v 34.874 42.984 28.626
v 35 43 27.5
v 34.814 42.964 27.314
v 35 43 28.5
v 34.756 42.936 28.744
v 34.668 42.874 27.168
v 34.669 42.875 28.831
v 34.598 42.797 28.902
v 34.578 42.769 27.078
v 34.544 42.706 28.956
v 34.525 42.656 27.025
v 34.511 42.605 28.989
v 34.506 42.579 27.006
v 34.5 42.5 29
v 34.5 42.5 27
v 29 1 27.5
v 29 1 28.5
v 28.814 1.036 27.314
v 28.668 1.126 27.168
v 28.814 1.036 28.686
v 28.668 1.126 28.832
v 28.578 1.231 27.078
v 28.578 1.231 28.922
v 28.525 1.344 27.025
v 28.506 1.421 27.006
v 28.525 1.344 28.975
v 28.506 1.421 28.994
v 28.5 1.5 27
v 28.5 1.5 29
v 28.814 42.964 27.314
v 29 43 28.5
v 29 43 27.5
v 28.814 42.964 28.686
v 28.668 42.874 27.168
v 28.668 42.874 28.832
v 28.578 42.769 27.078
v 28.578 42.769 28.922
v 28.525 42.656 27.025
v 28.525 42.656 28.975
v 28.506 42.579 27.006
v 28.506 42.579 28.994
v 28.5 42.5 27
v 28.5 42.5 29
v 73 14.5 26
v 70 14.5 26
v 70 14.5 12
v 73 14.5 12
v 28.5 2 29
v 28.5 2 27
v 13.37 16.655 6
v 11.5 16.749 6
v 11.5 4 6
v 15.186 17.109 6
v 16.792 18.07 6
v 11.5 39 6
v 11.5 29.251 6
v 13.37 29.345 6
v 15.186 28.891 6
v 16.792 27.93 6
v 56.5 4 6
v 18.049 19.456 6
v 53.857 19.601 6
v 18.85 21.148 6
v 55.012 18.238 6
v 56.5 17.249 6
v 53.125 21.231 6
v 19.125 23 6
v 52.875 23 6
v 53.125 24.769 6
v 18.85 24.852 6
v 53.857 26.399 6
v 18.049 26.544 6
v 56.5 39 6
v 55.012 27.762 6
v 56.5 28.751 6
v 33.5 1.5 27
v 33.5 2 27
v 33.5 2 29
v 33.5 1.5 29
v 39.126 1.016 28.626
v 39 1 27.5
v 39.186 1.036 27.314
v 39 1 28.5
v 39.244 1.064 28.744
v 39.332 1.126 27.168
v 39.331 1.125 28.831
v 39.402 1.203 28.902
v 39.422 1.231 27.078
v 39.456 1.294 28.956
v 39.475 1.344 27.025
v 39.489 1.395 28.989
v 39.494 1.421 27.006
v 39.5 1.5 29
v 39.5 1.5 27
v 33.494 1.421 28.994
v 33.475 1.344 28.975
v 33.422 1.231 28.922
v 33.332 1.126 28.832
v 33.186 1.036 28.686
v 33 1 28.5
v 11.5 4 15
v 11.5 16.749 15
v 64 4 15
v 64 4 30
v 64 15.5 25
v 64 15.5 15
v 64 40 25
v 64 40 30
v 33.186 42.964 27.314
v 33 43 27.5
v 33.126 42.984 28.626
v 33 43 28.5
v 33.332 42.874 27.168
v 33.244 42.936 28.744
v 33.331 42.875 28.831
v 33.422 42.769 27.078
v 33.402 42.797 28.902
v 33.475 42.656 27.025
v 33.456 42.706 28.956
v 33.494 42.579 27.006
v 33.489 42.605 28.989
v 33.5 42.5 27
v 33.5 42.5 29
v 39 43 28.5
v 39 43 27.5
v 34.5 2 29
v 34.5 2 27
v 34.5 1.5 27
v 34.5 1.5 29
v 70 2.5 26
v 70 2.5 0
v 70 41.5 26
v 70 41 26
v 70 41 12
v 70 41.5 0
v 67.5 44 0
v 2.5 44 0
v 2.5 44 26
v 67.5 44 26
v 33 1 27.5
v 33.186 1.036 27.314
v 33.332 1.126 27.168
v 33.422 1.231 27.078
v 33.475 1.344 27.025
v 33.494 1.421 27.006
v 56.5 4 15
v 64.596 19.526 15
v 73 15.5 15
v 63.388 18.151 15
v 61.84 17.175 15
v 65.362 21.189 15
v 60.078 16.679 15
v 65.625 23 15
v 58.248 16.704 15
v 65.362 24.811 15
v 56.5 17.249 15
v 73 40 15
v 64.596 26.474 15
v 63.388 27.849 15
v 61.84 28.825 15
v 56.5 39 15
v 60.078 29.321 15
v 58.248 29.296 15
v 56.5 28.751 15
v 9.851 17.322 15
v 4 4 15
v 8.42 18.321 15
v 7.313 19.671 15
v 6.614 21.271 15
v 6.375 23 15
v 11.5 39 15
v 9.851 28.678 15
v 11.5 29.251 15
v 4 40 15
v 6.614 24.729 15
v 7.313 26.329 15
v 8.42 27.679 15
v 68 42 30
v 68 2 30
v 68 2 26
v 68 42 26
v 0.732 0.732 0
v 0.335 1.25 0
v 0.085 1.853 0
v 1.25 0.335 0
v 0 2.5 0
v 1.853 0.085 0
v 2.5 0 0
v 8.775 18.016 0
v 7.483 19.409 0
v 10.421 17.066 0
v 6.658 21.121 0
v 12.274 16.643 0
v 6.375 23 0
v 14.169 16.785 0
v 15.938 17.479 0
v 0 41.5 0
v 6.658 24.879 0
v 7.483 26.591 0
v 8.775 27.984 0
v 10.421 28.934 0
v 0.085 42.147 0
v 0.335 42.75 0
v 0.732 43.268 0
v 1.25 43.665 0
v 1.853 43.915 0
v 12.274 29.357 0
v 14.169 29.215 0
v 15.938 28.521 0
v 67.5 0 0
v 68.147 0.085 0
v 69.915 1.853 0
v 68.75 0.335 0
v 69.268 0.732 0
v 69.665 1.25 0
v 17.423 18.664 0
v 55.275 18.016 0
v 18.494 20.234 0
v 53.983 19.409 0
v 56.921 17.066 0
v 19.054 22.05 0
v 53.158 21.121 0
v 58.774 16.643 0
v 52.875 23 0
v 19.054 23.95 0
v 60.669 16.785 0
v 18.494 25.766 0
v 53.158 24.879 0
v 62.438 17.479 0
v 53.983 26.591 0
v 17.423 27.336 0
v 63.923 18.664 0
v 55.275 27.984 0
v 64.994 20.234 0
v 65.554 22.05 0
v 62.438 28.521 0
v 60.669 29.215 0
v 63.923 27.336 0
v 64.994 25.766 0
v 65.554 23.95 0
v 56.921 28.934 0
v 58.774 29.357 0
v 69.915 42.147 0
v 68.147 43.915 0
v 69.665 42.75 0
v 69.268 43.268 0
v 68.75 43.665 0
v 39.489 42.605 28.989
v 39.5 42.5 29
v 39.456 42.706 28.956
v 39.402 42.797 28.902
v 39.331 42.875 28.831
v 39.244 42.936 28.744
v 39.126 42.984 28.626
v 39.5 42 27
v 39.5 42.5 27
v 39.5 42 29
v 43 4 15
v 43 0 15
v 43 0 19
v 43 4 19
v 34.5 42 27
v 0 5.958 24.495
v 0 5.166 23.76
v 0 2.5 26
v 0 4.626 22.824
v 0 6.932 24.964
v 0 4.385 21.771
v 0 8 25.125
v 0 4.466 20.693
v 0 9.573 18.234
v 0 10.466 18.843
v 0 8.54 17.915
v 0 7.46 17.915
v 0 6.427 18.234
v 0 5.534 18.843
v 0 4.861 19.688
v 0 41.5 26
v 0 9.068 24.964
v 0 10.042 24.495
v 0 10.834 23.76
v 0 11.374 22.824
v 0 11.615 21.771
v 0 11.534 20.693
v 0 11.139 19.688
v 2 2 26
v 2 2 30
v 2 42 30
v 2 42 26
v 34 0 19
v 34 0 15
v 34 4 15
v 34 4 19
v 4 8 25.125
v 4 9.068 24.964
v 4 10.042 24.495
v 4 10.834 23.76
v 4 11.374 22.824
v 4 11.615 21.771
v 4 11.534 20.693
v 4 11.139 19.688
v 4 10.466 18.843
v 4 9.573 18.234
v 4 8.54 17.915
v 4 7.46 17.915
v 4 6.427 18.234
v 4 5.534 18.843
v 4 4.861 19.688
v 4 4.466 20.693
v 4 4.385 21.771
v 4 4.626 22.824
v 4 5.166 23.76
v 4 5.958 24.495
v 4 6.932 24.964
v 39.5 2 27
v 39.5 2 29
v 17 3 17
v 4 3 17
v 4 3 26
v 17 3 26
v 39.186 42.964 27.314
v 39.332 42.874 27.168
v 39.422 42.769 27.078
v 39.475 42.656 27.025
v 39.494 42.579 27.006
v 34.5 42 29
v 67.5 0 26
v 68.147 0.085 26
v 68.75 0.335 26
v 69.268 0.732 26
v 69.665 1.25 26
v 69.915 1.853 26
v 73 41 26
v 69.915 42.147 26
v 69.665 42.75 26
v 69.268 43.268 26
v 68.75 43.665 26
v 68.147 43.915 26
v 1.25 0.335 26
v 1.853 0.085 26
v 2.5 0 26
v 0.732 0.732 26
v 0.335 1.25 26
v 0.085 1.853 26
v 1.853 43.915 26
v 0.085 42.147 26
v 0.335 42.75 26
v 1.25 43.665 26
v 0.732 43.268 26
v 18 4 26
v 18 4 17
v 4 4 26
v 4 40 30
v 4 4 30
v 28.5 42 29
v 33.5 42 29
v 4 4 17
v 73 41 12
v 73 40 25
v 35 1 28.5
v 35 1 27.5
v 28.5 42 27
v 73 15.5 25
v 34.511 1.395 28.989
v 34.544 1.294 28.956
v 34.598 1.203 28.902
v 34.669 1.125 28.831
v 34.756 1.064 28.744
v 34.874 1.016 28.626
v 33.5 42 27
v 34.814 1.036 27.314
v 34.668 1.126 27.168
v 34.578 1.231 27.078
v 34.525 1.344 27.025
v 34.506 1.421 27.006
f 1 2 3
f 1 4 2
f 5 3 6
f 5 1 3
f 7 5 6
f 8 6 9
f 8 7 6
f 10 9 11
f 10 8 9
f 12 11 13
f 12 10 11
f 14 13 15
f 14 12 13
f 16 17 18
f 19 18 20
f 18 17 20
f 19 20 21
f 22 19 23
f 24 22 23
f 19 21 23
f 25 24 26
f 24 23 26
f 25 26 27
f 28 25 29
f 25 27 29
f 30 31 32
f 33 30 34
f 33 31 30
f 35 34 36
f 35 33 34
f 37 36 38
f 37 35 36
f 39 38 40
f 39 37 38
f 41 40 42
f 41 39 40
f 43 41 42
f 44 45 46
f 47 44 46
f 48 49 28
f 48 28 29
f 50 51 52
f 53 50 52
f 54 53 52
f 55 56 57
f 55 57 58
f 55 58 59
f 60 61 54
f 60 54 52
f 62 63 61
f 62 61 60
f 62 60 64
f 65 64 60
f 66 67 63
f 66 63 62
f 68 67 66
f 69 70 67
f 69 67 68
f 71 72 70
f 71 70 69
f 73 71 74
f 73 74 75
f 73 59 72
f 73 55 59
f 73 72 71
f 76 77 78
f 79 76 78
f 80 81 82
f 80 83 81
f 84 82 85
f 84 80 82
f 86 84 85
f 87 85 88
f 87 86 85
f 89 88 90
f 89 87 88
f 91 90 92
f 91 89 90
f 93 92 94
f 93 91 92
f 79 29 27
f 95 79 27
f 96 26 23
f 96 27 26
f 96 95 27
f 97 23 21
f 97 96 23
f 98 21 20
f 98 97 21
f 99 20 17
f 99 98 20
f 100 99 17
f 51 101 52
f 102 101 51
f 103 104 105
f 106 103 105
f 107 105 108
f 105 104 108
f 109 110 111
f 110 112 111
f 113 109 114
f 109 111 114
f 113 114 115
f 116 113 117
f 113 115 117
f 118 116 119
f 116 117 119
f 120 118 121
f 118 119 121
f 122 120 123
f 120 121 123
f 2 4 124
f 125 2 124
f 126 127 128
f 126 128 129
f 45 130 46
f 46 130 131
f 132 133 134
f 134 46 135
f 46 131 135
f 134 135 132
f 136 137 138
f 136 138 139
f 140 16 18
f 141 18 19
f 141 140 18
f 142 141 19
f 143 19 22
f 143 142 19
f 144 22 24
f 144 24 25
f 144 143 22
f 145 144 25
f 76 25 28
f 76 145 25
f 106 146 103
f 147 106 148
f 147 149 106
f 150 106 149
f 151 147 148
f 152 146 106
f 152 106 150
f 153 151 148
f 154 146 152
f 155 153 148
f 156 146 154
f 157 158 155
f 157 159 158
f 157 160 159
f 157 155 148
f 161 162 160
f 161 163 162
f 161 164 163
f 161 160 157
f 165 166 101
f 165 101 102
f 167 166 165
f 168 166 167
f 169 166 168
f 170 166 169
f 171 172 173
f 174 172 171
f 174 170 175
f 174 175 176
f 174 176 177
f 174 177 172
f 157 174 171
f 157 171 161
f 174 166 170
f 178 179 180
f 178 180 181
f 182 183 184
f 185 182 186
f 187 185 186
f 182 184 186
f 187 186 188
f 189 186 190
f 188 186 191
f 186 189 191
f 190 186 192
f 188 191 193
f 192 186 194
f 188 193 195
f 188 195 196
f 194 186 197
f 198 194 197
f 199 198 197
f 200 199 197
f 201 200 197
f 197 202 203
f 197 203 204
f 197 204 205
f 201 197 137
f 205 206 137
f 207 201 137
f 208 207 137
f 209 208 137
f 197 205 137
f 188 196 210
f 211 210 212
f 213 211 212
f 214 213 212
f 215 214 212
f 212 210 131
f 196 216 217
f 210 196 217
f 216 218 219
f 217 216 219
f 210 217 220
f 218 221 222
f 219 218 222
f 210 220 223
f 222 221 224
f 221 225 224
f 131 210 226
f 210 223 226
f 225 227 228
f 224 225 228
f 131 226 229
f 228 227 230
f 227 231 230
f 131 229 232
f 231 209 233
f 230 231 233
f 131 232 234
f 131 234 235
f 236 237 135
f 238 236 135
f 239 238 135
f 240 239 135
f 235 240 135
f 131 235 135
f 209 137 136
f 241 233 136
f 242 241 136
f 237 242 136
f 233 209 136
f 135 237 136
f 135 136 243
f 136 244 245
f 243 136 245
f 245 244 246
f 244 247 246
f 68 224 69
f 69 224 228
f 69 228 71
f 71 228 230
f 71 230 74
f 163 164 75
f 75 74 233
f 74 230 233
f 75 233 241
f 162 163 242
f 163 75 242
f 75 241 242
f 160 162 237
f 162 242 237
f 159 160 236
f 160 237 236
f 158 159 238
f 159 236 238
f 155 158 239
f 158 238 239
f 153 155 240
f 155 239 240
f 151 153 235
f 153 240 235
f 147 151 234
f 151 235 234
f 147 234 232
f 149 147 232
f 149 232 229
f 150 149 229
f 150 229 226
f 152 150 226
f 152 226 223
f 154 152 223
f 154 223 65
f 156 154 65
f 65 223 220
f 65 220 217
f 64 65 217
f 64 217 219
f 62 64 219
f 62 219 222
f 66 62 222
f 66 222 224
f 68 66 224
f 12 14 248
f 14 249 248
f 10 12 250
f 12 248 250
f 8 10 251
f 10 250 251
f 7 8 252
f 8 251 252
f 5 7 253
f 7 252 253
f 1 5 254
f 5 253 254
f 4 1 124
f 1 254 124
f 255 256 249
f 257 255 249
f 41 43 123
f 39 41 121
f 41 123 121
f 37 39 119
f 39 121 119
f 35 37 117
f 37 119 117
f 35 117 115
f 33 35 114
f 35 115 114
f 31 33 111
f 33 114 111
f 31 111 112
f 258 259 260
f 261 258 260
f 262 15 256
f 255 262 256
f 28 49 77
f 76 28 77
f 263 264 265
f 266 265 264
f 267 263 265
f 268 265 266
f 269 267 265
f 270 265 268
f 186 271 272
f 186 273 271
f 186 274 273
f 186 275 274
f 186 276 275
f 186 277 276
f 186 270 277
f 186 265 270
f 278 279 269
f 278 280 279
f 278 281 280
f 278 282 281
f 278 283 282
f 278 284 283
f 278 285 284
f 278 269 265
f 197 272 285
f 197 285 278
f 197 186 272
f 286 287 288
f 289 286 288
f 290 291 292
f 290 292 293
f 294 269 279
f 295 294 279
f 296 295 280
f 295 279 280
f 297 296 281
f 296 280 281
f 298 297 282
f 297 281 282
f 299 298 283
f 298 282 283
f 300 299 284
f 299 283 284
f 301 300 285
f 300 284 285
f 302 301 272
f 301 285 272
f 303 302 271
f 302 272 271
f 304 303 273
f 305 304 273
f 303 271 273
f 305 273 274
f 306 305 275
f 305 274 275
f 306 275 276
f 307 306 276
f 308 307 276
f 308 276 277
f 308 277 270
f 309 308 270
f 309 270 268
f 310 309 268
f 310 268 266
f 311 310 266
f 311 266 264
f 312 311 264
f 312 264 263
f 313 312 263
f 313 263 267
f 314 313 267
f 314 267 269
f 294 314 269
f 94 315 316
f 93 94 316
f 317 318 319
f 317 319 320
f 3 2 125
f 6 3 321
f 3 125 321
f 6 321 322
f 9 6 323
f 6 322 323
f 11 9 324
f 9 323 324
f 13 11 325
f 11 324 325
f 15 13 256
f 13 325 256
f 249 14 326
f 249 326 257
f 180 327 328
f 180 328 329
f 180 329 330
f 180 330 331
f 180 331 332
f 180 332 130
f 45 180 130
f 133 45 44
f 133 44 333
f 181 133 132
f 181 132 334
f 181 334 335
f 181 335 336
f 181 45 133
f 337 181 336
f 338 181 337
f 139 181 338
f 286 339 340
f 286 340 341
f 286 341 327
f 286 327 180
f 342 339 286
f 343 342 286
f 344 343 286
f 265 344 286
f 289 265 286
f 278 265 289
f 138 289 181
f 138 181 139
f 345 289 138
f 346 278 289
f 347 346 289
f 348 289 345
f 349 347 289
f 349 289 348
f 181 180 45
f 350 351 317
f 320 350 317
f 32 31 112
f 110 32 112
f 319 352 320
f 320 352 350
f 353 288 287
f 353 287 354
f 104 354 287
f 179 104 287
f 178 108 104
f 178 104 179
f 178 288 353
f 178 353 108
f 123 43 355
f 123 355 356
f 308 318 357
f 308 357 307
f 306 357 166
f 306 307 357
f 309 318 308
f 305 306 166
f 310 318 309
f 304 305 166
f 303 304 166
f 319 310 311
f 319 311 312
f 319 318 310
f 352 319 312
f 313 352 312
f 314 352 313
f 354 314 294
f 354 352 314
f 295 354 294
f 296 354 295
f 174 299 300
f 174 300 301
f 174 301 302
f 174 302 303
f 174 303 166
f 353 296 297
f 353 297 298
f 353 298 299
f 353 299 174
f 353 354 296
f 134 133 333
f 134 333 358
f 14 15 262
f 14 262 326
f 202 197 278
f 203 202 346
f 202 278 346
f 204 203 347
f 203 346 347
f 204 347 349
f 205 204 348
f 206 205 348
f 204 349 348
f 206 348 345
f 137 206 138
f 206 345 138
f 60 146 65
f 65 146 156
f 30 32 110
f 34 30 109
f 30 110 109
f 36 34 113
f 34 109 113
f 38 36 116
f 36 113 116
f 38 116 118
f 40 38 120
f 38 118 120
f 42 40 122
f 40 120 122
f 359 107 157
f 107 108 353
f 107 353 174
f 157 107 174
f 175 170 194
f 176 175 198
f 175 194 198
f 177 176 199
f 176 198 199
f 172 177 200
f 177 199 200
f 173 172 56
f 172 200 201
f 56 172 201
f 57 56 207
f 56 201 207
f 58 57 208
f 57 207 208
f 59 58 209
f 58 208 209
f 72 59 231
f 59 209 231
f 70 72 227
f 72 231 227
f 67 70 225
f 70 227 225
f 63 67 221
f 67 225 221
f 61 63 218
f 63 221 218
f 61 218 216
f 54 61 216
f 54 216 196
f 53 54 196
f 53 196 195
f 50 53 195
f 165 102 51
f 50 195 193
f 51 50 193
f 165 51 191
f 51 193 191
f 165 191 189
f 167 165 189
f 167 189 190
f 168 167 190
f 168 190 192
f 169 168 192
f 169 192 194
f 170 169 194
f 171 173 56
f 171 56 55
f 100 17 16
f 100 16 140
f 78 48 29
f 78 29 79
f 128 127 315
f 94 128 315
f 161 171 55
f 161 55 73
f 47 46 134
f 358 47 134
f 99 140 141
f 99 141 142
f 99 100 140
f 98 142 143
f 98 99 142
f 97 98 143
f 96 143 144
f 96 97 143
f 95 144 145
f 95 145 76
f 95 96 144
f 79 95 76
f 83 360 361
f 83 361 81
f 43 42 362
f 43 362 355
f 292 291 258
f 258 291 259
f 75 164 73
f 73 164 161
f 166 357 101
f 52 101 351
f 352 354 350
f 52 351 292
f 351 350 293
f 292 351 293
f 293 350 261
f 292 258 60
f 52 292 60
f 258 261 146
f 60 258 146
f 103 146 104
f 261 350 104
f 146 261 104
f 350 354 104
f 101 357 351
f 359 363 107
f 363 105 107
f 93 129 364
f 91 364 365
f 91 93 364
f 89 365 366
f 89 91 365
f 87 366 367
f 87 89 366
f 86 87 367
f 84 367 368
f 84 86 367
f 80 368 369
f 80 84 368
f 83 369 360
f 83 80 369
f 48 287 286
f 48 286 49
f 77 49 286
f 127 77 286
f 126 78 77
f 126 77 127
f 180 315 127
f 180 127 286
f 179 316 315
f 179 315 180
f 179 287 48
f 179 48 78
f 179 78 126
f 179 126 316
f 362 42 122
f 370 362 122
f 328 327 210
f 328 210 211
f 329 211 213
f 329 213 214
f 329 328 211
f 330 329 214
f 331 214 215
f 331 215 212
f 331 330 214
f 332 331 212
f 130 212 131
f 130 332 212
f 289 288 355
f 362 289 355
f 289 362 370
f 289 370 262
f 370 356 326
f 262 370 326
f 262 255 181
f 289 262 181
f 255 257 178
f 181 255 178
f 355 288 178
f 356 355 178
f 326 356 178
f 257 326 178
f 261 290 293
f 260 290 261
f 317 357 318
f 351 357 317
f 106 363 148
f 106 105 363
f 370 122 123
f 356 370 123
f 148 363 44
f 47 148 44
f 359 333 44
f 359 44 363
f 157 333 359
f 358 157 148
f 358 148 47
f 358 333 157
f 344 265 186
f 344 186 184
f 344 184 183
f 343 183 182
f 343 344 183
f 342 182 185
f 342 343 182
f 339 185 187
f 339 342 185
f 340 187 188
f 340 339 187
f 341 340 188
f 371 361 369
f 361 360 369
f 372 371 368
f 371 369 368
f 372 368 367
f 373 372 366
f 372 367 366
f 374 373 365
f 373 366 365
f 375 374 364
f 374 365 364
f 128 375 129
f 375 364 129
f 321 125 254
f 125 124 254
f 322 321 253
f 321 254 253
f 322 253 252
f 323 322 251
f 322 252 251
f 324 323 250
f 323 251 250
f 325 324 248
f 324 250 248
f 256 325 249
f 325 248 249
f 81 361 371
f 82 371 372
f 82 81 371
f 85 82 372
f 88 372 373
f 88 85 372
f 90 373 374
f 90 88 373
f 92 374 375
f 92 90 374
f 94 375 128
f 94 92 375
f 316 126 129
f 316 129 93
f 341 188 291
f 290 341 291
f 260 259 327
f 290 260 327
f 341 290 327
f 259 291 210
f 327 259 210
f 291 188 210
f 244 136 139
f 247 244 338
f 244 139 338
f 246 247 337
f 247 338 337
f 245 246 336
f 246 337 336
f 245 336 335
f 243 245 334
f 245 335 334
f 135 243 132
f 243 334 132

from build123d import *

# Parameters (mm, degrees)
SKETCH1_W                   = 70
SKETCH1_H                   = 44
MIAN_BOSS_EXTRUDE_DEPTH     = 30
SKETCH2_W                   = 60
SKETCH2_H                   = 36
MAIN_CUT_DEPTH              = 15
SKETCH4_W                   = 45
SKETCH4_H                   = 35
BATTERY_CUT_DEPTH           = 9
SKETCH5_R                   = 6.375
ELCTRODE_CUT_DEPTH          = 18
SKETCH6_W                   = 10
SKETCH6_H                   = 24.5
USB_C_CUT_DEPTH             = 7
SKETCH7_R                   = 3.625
BUTTON_CUT_DEPTH            = 7
SKETCH8_W                   = 9
SKETCH8_H                   = 4
SWITCH_CUT_DEPTH            = 7
OUTSIDE_FILLET_R            = 2.5
SKETCH10_OUTSIDE_W          = 89.59
SKETCH10_OUTSIDE_H          = 63.59
SKETCH10_OUTSIDE_W_2        = 66
SKETCH10_OUTSIDE_H_2        = 40
OUTER_LID_EXTRUDE_DEPTH     = 4
LID_SNAP_EXTRUDE_DEPTH      = 1
LID_SNAP_EXTRUDE_DEPTH_BACK = 41
SKETCH11_W                  = 5
SKETCH11_H                  = 2
SKETCH13_W                  = 11
SKETCH13_H                  = 36
INNER_LID_EXTRUDE_DEPTH     = 3
SKETCH14_W                  = 14
SKETCH14_H                  = 26.5
SKETCH14_W_2                = 10
SKETCH14_H_2                = 24.5
USB_COVER_EXTRUDE_DEPTH     = 3
SKETCH15_W                  = 4
SKETCH15_H                  = 9
BUTTON_SIDE_CUT_DEPTH       = 1
CHAMFER1_SIZE               = 10
LID_SNAP_FILLET_R           = 0.5


with BuildPart() as part:
    # Sketch1 → Mian Boss Extrude (new body)
    with BuildSketch(Plane.XY):
        with Locations((35, 22)):
            Rectangle(SKETCH1_W, SKETCH1_H)
    extrude(amount=MIAN_BOSS_EXTRUDE_DEPTH)

    # Sketch2 → Main cut (cut)
    with BuildSketch(Plane.XY.offset(30)):
        with Locations((34, 22)):
            Rectangle(SKETCH2_W, SKETCH2_H)
    extrude(amount=-MAIN_CUT_DEPTH, mode=Mode.SUBTRACT)

    # Sketch4 → Battery Cut (cut)
    with BuildSketch(Plane.XY.offset(15)):
        with Locations((34, 21.5)):
            Rectangle(SKETCH4_W, SKETCH4_H)
    extrude(amount=-BATTERY_CUT_DEPTH, mode=Mode.SUBTRACT)

    # Sketch5 → Elctrode Cut (cut)
    with BuildSketch(Plane(origin=(0, 0, 0), x_dir=(-1, 0, 0), z_dir=(0, 0, -1))):
        with Locations((-59.25, 23)):
            Circle(SKETCH5_R)
        with Locations((-12.75, 23)):
            Circle(SKETCH5_R)
    extrude(amount=-ELCTRODE_CUT_DEPTH, mode=Mode.SUBTRACT)

    # Sketch6 → USB-c Cut (cut)
    with BuildSketch(Plane(origin=(70, 0, 0), x_dir=(0, 0, -1), z_dir=(1, 0, 0))):
        with Locations((-20, 27.75)):
            Rectangle(SKETCH6_W, SKETCH6_H)
    extrude(amount=-USB_C_CUT_DEPTH, mode=Mode.SUBTRACT)

    # Sketch7 → Button Cut (cut)
    with BuildSketch(Plane.ZY):
        with Locations((21.5, 8)):
            Circle(SKETCH7_R)
    extrude(amount=-BUTTON_CUT_DEPTH, mode=Mode.SUBTRACT)

    # Sketch8 → Switch Cut (cut)
    with BuildSketch(Plane.XZ):
        with Locations((38.5, 17)):
            Rectangle(SKETCH8_W, SKETCH8_H)
    extrude(amount=-SWITCH_CUT_DEPTH, mode=Mode.SUBTRACT)

    # Outside Fillet
    outside_fillet_edges = [part.edges().sort_by_distance(p)[0] for p in [
        (0, 44, 15),
        (70, 44, 15),
        (70, 0, 15),
        (0, 0, 15),
    ]]
    fillet(outside_fillet_edges, radius=OUTSIDE_FILLET_R)

    # Sketch10 outside → Outer lid Extrude (cut)
    with BuildSketch(Plane.XY.offset(30)):
        with Locations((35, 22)):
            Rectangle(SKETCH10_OUTSIDE_W, SKETCH10_OUTSIDE_H)
        with Locations((35, 22)):
            Rectangle(SKETCH10_OUTSIDE_W_2, SKETCH10_OUTSIDE_H_2, mode=Mode.SUBTRACT)
    extrude(amount=-OUTER_LID_EXTRUDE_DEPTH, mode=Mode.SUBTRACT)

    # Sketch11 → Lid Snap-Extrude (add, two sides: drawn at the far end of the back side and taken through both)
    with BuildSketch(Plane.XZ.offset(-2).offset(-LID_SNAP_EXTRUDE_DEPTH_BACK)):
        with Locations((31, 28)):
            Rectangle(SKETCH11_W, SKETCH11_H)
        with Locations((37, 28)):
            Rectangle(SKETCH11_W, SKETCH11_H)
    extrude(amount=LID_SNAP_EXTRUDE_DEPTH + LID_SNAP_EXTRUDE_DEPTH_BACK)

    # Sketch13 → Inner Lid-Extrude (cut)
    with BuildSketch(Plane.XY.offset(29)):
        with Locations((34, 22)):
            Rectangle(SKETCH13_W, SKETCH13_H)
    extrude(amount=-INNER_LID_EXTRUDE_DEPTH, mode=Mode.SUBTRACT)

    # Sketch14 → USB Cover-Extrude (add)
    with BuildSketch(Plane(origin=(70, 0, 0), x_dir=(0, 0, -1), z_dir=(1, 0, 0))):
        with Locations((-19, 27.75)):
            Rectangle(SKETCH14_W, SKETCH14_H)
        with Locations((-20, 27.75)):
            Rectangle(SKETCH14_W_2, SKETCH14_H_2, mode=Mode.SUBTRACT)
    extrude(amount=USB_COVER_EXTRUDE_DEPTH)

    # Sketch15 → Button side cut (cut)
    with BuildSketch(Plane(origin=(0, 4, 0), x_dir=(1, 0, 0), z_dir=(0, 1, 0))):
        with Locations((6, -21.5)):
            Rectangle(SKETCH15_W, SKETCH15_H)
    extrude(amount=-BUTTON_SIDE_CUT_DEPTH, mode=Mode.SUBTRACT)

    # Chamfer1
    # the kernel refuses this chamfer: 10 mm, written as the material it takes off along each edge
    with BuildSketch(Plane(origin=(8, 4, 17), x_dir=(0.9996219169112968, 0.027495876610586403, 0), z_dir=(0, 0, 1))) as chamfer1_piece_1_section:
        Polygon((CHAMFER1_SIZE * 0.999621916911, -CHAMFER1_SIZE * 0.0274958766106), (-CHAMFER1_SIZE * 0.0274958766106, -CHAMFER1_SIZE * 0.999621916911), (0, 0), align=None)
    chamfer1_piece_1 = extrude(amount=9, mode=Mode.PRIVATE)
    chamfer1_piece_1 = split(chamfer1_piece_1, bisect_by=Plane(origin=(14.506944444, 3, 21.5), z_dir=(0, 1, 0)), keep=Keep.TOP, mode=Mode.PRIVATE)
    add(chamfer1_piece_1, mode=Mode.SUBTRACT)

    # Lid Snap Fillet
    lid_snap_fillet_edges = [part.edges().sort_by_distance(p)[0] for p in [
        (28.5, 43, 28),
        (31, 43, 29),
        (33.5, 43, 28),
        (31, 43, 27),
        (28.5, 1, 28),
        (31, 1, 27),
        (33.5, 1, 28),
        (31, 1, 29),
        (37, 43, 29),
        (39.5, 43, 28),
        (37, 43, 27),
        (34.5, 43, 28),
        (37, 1, 29),
        (34.5, 1, 28),
        (37, 1, 27),
        (39.5, 1, 28),
    ]]
    fillet(lid_snap_fillet_edges, radius=LID_SNAP_FILLET_R)


solid = part.part
